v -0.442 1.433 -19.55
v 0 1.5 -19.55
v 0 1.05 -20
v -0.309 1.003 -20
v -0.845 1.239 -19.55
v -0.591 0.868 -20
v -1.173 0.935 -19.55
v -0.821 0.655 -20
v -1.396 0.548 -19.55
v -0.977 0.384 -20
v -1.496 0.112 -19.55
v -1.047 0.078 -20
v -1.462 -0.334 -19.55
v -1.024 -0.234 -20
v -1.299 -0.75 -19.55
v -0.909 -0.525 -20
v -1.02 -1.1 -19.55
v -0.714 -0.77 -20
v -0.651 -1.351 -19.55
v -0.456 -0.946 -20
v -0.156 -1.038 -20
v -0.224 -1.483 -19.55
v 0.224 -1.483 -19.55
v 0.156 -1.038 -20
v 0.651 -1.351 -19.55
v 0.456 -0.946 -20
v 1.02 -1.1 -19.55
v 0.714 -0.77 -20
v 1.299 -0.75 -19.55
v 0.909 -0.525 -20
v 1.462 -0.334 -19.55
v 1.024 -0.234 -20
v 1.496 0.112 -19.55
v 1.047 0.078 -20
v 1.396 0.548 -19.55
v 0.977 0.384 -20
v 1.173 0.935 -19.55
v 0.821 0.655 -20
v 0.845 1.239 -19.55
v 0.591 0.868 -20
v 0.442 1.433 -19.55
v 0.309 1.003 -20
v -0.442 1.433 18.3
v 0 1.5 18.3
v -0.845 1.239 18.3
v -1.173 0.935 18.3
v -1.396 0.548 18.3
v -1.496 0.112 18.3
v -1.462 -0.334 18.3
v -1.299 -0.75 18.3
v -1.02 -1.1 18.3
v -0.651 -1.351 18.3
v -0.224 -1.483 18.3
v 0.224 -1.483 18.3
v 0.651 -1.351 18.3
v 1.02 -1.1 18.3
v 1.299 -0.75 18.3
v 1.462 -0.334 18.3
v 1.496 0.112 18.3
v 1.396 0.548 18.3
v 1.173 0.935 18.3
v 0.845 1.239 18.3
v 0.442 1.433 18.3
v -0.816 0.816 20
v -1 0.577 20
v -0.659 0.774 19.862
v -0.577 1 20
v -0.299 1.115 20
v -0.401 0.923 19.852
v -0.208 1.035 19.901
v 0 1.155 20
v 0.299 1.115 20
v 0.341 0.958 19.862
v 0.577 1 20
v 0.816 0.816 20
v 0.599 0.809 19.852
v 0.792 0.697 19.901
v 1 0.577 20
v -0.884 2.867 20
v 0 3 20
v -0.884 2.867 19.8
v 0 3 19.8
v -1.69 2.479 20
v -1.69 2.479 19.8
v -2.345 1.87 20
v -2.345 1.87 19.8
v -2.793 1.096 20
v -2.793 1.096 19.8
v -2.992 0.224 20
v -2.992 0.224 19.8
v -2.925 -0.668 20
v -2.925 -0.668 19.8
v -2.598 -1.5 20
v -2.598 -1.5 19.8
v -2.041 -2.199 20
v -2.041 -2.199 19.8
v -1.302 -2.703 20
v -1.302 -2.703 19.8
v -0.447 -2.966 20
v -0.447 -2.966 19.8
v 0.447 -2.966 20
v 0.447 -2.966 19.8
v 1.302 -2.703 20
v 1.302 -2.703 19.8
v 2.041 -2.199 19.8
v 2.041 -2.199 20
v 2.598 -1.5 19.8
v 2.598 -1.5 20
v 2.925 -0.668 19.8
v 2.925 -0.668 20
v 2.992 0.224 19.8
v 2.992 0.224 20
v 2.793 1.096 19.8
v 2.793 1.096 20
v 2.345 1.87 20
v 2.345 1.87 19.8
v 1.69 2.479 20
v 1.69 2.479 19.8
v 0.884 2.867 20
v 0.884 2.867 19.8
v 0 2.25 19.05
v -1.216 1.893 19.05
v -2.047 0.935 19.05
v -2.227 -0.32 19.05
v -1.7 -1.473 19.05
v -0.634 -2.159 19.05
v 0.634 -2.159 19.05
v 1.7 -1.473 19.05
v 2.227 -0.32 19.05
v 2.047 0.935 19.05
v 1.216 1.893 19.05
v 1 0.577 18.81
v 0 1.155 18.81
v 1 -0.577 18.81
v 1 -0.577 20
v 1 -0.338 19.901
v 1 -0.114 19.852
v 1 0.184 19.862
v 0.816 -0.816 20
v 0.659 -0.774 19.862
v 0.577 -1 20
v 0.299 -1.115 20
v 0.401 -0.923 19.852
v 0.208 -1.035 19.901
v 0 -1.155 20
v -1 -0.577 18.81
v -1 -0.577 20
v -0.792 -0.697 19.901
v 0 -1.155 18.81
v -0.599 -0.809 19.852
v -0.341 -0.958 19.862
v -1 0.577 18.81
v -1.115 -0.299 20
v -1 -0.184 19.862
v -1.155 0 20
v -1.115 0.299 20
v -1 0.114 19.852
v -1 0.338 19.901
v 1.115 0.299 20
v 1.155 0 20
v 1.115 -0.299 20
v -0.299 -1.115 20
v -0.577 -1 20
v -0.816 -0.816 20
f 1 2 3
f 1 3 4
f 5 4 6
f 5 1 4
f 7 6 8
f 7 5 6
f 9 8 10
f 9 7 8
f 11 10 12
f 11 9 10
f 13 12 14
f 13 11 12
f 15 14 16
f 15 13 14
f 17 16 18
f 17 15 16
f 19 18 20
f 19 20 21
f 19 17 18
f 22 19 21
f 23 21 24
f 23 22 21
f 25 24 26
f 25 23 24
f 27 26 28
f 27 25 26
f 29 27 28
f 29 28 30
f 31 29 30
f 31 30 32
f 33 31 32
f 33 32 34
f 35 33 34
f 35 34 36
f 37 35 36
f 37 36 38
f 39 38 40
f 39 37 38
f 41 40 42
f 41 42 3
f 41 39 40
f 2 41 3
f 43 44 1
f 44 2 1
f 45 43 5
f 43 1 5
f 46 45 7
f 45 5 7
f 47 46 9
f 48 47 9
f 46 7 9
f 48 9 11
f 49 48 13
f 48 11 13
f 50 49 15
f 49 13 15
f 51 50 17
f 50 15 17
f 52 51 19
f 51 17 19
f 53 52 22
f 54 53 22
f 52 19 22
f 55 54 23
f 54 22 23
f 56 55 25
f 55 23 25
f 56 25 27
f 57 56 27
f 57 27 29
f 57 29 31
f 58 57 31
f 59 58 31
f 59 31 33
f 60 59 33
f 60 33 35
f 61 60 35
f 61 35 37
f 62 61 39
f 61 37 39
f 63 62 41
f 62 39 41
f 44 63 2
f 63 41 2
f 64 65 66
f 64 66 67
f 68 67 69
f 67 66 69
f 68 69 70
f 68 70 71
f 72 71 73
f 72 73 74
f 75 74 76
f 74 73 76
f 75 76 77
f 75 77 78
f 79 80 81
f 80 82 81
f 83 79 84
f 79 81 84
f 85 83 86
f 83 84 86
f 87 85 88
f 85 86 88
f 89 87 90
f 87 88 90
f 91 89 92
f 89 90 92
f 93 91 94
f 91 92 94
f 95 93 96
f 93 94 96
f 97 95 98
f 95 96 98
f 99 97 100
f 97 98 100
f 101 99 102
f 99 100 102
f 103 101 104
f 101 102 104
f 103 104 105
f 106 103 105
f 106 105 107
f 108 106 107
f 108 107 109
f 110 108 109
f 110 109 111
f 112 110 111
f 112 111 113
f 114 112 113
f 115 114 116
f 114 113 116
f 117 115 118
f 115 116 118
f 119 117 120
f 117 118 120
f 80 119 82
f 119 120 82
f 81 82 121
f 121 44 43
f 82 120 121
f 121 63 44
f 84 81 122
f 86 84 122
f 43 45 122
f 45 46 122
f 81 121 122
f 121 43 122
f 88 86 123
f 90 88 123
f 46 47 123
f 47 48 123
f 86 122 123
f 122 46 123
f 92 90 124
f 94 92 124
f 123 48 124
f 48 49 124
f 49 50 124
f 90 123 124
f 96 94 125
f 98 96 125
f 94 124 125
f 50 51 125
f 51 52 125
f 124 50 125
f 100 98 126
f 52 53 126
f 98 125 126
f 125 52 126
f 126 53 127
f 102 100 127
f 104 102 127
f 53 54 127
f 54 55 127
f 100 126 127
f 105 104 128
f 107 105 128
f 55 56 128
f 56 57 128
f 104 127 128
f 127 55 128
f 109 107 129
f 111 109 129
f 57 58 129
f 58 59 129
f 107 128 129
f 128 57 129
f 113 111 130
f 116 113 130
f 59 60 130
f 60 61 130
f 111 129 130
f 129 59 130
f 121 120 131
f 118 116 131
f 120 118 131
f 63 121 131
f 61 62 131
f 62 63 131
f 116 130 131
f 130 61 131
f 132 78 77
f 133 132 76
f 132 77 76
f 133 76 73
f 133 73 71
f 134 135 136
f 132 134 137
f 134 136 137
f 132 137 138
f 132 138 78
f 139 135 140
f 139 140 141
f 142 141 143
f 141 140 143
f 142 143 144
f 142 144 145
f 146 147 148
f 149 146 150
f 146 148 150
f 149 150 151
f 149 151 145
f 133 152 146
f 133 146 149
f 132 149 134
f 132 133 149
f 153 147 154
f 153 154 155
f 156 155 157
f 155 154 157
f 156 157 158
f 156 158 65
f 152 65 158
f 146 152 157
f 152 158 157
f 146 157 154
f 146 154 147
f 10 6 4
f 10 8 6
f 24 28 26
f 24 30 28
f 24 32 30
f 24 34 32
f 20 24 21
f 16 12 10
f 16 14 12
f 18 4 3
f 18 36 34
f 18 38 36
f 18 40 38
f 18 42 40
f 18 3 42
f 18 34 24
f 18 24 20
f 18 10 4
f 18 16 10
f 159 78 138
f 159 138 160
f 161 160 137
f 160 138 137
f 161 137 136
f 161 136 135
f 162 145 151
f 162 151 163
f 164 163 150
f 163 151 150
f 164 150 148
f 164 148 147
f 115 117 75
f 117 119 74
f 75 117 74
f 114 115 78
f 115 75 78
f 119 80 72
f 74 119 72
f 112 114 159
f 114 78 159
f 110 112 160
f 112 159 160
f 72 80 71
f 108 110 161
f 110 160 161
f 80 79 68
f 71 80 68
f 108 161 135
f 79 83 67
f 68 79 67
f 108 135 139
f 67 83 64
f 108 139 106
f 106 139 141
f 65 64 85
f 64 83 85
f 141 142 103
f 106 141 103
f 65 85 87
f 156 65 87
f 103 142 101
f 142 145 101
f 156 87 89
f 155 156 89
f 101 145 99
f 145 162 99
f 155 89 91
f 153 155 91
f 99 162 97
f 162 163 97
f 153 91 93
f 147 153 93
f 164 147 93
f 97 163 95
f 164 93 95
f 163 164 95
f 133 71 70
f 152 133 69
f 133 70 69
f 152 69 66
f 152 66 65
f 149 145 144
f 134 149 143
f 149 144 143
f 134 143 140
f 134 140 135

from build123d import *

# Parameters (mm, degrees)
SKETCH3_W          = 40
SKETCH3_H          = 1.5
CHAMFER1_SIZE      = 0.45
CUT_EXTRUDE1_DEPTH = 1.19


with BuildPart() as part:
    # Sketch3 → Revolve1 (revolve)
    with BuildSketch(Plane(origin=(0, 0, 0), x_dir=(0, 0, -1), z_dir=(1, 0, 0))):
        with Locations((0, 0.75)):
            Rectangle(SKETCH3_W, SKETCH3_H)
    revolve(axis=Axis((0, 0, -20), (0, 0, 1)))

    # Chamfer1
    chamfer1_edges = [part.edges().sort_by_distance(p)[0] for p in [
        (0, -1.5, -20),
    ]]
    chamfer(chamfer1_edges, length=CHAMFER1_SIZE)

    # Sketch6 → Revolve2 (revolve)
    with BuildSketch(Plane(origin=(0, 0, 0), x_dir=(0, 0, -1), z_dir=(1, 0, 0))):
        Polygon((-20, 3), (-19.8, 3), (-18.3, 1.5), (-18.3, 0), (-20, 0), align=None)
    revolve(axis=Axis((0, 0, -20), (0, 0, 1)))

    # Sketch8 → Cut-Extrude1 (cut)
    with BuildSketch(Plane.XY.offset(20)):
        Polygon((0, 1.154700538), (-1, 0.577350269), (-1, -0.577350269), (0, -1.154700538), (1, -0.577350269), (1, 0.577350269), align=None)
    extrude(amount=-CUT_EXTRUDE1_DEPTH, mode=Mode.SUBTRACT)

    # Cut-Extrude2 cone 1 section (through the dimple's axis) → Cut-Extrude2 (revolve, cut)
    with BuildSketch(Plane(origin=(0, 0, 20), x_dir=(0, -1, 0), z_dir=(1, 0, 0))):
        Polygon((0, 0), (1.154700538, 0), (0, 1.154700538), align=None)
    revolve(axis=Axis((0, 0, 20), (0, 0, -1)), mode=Mode.SUBTRACT)


solid = part.part
